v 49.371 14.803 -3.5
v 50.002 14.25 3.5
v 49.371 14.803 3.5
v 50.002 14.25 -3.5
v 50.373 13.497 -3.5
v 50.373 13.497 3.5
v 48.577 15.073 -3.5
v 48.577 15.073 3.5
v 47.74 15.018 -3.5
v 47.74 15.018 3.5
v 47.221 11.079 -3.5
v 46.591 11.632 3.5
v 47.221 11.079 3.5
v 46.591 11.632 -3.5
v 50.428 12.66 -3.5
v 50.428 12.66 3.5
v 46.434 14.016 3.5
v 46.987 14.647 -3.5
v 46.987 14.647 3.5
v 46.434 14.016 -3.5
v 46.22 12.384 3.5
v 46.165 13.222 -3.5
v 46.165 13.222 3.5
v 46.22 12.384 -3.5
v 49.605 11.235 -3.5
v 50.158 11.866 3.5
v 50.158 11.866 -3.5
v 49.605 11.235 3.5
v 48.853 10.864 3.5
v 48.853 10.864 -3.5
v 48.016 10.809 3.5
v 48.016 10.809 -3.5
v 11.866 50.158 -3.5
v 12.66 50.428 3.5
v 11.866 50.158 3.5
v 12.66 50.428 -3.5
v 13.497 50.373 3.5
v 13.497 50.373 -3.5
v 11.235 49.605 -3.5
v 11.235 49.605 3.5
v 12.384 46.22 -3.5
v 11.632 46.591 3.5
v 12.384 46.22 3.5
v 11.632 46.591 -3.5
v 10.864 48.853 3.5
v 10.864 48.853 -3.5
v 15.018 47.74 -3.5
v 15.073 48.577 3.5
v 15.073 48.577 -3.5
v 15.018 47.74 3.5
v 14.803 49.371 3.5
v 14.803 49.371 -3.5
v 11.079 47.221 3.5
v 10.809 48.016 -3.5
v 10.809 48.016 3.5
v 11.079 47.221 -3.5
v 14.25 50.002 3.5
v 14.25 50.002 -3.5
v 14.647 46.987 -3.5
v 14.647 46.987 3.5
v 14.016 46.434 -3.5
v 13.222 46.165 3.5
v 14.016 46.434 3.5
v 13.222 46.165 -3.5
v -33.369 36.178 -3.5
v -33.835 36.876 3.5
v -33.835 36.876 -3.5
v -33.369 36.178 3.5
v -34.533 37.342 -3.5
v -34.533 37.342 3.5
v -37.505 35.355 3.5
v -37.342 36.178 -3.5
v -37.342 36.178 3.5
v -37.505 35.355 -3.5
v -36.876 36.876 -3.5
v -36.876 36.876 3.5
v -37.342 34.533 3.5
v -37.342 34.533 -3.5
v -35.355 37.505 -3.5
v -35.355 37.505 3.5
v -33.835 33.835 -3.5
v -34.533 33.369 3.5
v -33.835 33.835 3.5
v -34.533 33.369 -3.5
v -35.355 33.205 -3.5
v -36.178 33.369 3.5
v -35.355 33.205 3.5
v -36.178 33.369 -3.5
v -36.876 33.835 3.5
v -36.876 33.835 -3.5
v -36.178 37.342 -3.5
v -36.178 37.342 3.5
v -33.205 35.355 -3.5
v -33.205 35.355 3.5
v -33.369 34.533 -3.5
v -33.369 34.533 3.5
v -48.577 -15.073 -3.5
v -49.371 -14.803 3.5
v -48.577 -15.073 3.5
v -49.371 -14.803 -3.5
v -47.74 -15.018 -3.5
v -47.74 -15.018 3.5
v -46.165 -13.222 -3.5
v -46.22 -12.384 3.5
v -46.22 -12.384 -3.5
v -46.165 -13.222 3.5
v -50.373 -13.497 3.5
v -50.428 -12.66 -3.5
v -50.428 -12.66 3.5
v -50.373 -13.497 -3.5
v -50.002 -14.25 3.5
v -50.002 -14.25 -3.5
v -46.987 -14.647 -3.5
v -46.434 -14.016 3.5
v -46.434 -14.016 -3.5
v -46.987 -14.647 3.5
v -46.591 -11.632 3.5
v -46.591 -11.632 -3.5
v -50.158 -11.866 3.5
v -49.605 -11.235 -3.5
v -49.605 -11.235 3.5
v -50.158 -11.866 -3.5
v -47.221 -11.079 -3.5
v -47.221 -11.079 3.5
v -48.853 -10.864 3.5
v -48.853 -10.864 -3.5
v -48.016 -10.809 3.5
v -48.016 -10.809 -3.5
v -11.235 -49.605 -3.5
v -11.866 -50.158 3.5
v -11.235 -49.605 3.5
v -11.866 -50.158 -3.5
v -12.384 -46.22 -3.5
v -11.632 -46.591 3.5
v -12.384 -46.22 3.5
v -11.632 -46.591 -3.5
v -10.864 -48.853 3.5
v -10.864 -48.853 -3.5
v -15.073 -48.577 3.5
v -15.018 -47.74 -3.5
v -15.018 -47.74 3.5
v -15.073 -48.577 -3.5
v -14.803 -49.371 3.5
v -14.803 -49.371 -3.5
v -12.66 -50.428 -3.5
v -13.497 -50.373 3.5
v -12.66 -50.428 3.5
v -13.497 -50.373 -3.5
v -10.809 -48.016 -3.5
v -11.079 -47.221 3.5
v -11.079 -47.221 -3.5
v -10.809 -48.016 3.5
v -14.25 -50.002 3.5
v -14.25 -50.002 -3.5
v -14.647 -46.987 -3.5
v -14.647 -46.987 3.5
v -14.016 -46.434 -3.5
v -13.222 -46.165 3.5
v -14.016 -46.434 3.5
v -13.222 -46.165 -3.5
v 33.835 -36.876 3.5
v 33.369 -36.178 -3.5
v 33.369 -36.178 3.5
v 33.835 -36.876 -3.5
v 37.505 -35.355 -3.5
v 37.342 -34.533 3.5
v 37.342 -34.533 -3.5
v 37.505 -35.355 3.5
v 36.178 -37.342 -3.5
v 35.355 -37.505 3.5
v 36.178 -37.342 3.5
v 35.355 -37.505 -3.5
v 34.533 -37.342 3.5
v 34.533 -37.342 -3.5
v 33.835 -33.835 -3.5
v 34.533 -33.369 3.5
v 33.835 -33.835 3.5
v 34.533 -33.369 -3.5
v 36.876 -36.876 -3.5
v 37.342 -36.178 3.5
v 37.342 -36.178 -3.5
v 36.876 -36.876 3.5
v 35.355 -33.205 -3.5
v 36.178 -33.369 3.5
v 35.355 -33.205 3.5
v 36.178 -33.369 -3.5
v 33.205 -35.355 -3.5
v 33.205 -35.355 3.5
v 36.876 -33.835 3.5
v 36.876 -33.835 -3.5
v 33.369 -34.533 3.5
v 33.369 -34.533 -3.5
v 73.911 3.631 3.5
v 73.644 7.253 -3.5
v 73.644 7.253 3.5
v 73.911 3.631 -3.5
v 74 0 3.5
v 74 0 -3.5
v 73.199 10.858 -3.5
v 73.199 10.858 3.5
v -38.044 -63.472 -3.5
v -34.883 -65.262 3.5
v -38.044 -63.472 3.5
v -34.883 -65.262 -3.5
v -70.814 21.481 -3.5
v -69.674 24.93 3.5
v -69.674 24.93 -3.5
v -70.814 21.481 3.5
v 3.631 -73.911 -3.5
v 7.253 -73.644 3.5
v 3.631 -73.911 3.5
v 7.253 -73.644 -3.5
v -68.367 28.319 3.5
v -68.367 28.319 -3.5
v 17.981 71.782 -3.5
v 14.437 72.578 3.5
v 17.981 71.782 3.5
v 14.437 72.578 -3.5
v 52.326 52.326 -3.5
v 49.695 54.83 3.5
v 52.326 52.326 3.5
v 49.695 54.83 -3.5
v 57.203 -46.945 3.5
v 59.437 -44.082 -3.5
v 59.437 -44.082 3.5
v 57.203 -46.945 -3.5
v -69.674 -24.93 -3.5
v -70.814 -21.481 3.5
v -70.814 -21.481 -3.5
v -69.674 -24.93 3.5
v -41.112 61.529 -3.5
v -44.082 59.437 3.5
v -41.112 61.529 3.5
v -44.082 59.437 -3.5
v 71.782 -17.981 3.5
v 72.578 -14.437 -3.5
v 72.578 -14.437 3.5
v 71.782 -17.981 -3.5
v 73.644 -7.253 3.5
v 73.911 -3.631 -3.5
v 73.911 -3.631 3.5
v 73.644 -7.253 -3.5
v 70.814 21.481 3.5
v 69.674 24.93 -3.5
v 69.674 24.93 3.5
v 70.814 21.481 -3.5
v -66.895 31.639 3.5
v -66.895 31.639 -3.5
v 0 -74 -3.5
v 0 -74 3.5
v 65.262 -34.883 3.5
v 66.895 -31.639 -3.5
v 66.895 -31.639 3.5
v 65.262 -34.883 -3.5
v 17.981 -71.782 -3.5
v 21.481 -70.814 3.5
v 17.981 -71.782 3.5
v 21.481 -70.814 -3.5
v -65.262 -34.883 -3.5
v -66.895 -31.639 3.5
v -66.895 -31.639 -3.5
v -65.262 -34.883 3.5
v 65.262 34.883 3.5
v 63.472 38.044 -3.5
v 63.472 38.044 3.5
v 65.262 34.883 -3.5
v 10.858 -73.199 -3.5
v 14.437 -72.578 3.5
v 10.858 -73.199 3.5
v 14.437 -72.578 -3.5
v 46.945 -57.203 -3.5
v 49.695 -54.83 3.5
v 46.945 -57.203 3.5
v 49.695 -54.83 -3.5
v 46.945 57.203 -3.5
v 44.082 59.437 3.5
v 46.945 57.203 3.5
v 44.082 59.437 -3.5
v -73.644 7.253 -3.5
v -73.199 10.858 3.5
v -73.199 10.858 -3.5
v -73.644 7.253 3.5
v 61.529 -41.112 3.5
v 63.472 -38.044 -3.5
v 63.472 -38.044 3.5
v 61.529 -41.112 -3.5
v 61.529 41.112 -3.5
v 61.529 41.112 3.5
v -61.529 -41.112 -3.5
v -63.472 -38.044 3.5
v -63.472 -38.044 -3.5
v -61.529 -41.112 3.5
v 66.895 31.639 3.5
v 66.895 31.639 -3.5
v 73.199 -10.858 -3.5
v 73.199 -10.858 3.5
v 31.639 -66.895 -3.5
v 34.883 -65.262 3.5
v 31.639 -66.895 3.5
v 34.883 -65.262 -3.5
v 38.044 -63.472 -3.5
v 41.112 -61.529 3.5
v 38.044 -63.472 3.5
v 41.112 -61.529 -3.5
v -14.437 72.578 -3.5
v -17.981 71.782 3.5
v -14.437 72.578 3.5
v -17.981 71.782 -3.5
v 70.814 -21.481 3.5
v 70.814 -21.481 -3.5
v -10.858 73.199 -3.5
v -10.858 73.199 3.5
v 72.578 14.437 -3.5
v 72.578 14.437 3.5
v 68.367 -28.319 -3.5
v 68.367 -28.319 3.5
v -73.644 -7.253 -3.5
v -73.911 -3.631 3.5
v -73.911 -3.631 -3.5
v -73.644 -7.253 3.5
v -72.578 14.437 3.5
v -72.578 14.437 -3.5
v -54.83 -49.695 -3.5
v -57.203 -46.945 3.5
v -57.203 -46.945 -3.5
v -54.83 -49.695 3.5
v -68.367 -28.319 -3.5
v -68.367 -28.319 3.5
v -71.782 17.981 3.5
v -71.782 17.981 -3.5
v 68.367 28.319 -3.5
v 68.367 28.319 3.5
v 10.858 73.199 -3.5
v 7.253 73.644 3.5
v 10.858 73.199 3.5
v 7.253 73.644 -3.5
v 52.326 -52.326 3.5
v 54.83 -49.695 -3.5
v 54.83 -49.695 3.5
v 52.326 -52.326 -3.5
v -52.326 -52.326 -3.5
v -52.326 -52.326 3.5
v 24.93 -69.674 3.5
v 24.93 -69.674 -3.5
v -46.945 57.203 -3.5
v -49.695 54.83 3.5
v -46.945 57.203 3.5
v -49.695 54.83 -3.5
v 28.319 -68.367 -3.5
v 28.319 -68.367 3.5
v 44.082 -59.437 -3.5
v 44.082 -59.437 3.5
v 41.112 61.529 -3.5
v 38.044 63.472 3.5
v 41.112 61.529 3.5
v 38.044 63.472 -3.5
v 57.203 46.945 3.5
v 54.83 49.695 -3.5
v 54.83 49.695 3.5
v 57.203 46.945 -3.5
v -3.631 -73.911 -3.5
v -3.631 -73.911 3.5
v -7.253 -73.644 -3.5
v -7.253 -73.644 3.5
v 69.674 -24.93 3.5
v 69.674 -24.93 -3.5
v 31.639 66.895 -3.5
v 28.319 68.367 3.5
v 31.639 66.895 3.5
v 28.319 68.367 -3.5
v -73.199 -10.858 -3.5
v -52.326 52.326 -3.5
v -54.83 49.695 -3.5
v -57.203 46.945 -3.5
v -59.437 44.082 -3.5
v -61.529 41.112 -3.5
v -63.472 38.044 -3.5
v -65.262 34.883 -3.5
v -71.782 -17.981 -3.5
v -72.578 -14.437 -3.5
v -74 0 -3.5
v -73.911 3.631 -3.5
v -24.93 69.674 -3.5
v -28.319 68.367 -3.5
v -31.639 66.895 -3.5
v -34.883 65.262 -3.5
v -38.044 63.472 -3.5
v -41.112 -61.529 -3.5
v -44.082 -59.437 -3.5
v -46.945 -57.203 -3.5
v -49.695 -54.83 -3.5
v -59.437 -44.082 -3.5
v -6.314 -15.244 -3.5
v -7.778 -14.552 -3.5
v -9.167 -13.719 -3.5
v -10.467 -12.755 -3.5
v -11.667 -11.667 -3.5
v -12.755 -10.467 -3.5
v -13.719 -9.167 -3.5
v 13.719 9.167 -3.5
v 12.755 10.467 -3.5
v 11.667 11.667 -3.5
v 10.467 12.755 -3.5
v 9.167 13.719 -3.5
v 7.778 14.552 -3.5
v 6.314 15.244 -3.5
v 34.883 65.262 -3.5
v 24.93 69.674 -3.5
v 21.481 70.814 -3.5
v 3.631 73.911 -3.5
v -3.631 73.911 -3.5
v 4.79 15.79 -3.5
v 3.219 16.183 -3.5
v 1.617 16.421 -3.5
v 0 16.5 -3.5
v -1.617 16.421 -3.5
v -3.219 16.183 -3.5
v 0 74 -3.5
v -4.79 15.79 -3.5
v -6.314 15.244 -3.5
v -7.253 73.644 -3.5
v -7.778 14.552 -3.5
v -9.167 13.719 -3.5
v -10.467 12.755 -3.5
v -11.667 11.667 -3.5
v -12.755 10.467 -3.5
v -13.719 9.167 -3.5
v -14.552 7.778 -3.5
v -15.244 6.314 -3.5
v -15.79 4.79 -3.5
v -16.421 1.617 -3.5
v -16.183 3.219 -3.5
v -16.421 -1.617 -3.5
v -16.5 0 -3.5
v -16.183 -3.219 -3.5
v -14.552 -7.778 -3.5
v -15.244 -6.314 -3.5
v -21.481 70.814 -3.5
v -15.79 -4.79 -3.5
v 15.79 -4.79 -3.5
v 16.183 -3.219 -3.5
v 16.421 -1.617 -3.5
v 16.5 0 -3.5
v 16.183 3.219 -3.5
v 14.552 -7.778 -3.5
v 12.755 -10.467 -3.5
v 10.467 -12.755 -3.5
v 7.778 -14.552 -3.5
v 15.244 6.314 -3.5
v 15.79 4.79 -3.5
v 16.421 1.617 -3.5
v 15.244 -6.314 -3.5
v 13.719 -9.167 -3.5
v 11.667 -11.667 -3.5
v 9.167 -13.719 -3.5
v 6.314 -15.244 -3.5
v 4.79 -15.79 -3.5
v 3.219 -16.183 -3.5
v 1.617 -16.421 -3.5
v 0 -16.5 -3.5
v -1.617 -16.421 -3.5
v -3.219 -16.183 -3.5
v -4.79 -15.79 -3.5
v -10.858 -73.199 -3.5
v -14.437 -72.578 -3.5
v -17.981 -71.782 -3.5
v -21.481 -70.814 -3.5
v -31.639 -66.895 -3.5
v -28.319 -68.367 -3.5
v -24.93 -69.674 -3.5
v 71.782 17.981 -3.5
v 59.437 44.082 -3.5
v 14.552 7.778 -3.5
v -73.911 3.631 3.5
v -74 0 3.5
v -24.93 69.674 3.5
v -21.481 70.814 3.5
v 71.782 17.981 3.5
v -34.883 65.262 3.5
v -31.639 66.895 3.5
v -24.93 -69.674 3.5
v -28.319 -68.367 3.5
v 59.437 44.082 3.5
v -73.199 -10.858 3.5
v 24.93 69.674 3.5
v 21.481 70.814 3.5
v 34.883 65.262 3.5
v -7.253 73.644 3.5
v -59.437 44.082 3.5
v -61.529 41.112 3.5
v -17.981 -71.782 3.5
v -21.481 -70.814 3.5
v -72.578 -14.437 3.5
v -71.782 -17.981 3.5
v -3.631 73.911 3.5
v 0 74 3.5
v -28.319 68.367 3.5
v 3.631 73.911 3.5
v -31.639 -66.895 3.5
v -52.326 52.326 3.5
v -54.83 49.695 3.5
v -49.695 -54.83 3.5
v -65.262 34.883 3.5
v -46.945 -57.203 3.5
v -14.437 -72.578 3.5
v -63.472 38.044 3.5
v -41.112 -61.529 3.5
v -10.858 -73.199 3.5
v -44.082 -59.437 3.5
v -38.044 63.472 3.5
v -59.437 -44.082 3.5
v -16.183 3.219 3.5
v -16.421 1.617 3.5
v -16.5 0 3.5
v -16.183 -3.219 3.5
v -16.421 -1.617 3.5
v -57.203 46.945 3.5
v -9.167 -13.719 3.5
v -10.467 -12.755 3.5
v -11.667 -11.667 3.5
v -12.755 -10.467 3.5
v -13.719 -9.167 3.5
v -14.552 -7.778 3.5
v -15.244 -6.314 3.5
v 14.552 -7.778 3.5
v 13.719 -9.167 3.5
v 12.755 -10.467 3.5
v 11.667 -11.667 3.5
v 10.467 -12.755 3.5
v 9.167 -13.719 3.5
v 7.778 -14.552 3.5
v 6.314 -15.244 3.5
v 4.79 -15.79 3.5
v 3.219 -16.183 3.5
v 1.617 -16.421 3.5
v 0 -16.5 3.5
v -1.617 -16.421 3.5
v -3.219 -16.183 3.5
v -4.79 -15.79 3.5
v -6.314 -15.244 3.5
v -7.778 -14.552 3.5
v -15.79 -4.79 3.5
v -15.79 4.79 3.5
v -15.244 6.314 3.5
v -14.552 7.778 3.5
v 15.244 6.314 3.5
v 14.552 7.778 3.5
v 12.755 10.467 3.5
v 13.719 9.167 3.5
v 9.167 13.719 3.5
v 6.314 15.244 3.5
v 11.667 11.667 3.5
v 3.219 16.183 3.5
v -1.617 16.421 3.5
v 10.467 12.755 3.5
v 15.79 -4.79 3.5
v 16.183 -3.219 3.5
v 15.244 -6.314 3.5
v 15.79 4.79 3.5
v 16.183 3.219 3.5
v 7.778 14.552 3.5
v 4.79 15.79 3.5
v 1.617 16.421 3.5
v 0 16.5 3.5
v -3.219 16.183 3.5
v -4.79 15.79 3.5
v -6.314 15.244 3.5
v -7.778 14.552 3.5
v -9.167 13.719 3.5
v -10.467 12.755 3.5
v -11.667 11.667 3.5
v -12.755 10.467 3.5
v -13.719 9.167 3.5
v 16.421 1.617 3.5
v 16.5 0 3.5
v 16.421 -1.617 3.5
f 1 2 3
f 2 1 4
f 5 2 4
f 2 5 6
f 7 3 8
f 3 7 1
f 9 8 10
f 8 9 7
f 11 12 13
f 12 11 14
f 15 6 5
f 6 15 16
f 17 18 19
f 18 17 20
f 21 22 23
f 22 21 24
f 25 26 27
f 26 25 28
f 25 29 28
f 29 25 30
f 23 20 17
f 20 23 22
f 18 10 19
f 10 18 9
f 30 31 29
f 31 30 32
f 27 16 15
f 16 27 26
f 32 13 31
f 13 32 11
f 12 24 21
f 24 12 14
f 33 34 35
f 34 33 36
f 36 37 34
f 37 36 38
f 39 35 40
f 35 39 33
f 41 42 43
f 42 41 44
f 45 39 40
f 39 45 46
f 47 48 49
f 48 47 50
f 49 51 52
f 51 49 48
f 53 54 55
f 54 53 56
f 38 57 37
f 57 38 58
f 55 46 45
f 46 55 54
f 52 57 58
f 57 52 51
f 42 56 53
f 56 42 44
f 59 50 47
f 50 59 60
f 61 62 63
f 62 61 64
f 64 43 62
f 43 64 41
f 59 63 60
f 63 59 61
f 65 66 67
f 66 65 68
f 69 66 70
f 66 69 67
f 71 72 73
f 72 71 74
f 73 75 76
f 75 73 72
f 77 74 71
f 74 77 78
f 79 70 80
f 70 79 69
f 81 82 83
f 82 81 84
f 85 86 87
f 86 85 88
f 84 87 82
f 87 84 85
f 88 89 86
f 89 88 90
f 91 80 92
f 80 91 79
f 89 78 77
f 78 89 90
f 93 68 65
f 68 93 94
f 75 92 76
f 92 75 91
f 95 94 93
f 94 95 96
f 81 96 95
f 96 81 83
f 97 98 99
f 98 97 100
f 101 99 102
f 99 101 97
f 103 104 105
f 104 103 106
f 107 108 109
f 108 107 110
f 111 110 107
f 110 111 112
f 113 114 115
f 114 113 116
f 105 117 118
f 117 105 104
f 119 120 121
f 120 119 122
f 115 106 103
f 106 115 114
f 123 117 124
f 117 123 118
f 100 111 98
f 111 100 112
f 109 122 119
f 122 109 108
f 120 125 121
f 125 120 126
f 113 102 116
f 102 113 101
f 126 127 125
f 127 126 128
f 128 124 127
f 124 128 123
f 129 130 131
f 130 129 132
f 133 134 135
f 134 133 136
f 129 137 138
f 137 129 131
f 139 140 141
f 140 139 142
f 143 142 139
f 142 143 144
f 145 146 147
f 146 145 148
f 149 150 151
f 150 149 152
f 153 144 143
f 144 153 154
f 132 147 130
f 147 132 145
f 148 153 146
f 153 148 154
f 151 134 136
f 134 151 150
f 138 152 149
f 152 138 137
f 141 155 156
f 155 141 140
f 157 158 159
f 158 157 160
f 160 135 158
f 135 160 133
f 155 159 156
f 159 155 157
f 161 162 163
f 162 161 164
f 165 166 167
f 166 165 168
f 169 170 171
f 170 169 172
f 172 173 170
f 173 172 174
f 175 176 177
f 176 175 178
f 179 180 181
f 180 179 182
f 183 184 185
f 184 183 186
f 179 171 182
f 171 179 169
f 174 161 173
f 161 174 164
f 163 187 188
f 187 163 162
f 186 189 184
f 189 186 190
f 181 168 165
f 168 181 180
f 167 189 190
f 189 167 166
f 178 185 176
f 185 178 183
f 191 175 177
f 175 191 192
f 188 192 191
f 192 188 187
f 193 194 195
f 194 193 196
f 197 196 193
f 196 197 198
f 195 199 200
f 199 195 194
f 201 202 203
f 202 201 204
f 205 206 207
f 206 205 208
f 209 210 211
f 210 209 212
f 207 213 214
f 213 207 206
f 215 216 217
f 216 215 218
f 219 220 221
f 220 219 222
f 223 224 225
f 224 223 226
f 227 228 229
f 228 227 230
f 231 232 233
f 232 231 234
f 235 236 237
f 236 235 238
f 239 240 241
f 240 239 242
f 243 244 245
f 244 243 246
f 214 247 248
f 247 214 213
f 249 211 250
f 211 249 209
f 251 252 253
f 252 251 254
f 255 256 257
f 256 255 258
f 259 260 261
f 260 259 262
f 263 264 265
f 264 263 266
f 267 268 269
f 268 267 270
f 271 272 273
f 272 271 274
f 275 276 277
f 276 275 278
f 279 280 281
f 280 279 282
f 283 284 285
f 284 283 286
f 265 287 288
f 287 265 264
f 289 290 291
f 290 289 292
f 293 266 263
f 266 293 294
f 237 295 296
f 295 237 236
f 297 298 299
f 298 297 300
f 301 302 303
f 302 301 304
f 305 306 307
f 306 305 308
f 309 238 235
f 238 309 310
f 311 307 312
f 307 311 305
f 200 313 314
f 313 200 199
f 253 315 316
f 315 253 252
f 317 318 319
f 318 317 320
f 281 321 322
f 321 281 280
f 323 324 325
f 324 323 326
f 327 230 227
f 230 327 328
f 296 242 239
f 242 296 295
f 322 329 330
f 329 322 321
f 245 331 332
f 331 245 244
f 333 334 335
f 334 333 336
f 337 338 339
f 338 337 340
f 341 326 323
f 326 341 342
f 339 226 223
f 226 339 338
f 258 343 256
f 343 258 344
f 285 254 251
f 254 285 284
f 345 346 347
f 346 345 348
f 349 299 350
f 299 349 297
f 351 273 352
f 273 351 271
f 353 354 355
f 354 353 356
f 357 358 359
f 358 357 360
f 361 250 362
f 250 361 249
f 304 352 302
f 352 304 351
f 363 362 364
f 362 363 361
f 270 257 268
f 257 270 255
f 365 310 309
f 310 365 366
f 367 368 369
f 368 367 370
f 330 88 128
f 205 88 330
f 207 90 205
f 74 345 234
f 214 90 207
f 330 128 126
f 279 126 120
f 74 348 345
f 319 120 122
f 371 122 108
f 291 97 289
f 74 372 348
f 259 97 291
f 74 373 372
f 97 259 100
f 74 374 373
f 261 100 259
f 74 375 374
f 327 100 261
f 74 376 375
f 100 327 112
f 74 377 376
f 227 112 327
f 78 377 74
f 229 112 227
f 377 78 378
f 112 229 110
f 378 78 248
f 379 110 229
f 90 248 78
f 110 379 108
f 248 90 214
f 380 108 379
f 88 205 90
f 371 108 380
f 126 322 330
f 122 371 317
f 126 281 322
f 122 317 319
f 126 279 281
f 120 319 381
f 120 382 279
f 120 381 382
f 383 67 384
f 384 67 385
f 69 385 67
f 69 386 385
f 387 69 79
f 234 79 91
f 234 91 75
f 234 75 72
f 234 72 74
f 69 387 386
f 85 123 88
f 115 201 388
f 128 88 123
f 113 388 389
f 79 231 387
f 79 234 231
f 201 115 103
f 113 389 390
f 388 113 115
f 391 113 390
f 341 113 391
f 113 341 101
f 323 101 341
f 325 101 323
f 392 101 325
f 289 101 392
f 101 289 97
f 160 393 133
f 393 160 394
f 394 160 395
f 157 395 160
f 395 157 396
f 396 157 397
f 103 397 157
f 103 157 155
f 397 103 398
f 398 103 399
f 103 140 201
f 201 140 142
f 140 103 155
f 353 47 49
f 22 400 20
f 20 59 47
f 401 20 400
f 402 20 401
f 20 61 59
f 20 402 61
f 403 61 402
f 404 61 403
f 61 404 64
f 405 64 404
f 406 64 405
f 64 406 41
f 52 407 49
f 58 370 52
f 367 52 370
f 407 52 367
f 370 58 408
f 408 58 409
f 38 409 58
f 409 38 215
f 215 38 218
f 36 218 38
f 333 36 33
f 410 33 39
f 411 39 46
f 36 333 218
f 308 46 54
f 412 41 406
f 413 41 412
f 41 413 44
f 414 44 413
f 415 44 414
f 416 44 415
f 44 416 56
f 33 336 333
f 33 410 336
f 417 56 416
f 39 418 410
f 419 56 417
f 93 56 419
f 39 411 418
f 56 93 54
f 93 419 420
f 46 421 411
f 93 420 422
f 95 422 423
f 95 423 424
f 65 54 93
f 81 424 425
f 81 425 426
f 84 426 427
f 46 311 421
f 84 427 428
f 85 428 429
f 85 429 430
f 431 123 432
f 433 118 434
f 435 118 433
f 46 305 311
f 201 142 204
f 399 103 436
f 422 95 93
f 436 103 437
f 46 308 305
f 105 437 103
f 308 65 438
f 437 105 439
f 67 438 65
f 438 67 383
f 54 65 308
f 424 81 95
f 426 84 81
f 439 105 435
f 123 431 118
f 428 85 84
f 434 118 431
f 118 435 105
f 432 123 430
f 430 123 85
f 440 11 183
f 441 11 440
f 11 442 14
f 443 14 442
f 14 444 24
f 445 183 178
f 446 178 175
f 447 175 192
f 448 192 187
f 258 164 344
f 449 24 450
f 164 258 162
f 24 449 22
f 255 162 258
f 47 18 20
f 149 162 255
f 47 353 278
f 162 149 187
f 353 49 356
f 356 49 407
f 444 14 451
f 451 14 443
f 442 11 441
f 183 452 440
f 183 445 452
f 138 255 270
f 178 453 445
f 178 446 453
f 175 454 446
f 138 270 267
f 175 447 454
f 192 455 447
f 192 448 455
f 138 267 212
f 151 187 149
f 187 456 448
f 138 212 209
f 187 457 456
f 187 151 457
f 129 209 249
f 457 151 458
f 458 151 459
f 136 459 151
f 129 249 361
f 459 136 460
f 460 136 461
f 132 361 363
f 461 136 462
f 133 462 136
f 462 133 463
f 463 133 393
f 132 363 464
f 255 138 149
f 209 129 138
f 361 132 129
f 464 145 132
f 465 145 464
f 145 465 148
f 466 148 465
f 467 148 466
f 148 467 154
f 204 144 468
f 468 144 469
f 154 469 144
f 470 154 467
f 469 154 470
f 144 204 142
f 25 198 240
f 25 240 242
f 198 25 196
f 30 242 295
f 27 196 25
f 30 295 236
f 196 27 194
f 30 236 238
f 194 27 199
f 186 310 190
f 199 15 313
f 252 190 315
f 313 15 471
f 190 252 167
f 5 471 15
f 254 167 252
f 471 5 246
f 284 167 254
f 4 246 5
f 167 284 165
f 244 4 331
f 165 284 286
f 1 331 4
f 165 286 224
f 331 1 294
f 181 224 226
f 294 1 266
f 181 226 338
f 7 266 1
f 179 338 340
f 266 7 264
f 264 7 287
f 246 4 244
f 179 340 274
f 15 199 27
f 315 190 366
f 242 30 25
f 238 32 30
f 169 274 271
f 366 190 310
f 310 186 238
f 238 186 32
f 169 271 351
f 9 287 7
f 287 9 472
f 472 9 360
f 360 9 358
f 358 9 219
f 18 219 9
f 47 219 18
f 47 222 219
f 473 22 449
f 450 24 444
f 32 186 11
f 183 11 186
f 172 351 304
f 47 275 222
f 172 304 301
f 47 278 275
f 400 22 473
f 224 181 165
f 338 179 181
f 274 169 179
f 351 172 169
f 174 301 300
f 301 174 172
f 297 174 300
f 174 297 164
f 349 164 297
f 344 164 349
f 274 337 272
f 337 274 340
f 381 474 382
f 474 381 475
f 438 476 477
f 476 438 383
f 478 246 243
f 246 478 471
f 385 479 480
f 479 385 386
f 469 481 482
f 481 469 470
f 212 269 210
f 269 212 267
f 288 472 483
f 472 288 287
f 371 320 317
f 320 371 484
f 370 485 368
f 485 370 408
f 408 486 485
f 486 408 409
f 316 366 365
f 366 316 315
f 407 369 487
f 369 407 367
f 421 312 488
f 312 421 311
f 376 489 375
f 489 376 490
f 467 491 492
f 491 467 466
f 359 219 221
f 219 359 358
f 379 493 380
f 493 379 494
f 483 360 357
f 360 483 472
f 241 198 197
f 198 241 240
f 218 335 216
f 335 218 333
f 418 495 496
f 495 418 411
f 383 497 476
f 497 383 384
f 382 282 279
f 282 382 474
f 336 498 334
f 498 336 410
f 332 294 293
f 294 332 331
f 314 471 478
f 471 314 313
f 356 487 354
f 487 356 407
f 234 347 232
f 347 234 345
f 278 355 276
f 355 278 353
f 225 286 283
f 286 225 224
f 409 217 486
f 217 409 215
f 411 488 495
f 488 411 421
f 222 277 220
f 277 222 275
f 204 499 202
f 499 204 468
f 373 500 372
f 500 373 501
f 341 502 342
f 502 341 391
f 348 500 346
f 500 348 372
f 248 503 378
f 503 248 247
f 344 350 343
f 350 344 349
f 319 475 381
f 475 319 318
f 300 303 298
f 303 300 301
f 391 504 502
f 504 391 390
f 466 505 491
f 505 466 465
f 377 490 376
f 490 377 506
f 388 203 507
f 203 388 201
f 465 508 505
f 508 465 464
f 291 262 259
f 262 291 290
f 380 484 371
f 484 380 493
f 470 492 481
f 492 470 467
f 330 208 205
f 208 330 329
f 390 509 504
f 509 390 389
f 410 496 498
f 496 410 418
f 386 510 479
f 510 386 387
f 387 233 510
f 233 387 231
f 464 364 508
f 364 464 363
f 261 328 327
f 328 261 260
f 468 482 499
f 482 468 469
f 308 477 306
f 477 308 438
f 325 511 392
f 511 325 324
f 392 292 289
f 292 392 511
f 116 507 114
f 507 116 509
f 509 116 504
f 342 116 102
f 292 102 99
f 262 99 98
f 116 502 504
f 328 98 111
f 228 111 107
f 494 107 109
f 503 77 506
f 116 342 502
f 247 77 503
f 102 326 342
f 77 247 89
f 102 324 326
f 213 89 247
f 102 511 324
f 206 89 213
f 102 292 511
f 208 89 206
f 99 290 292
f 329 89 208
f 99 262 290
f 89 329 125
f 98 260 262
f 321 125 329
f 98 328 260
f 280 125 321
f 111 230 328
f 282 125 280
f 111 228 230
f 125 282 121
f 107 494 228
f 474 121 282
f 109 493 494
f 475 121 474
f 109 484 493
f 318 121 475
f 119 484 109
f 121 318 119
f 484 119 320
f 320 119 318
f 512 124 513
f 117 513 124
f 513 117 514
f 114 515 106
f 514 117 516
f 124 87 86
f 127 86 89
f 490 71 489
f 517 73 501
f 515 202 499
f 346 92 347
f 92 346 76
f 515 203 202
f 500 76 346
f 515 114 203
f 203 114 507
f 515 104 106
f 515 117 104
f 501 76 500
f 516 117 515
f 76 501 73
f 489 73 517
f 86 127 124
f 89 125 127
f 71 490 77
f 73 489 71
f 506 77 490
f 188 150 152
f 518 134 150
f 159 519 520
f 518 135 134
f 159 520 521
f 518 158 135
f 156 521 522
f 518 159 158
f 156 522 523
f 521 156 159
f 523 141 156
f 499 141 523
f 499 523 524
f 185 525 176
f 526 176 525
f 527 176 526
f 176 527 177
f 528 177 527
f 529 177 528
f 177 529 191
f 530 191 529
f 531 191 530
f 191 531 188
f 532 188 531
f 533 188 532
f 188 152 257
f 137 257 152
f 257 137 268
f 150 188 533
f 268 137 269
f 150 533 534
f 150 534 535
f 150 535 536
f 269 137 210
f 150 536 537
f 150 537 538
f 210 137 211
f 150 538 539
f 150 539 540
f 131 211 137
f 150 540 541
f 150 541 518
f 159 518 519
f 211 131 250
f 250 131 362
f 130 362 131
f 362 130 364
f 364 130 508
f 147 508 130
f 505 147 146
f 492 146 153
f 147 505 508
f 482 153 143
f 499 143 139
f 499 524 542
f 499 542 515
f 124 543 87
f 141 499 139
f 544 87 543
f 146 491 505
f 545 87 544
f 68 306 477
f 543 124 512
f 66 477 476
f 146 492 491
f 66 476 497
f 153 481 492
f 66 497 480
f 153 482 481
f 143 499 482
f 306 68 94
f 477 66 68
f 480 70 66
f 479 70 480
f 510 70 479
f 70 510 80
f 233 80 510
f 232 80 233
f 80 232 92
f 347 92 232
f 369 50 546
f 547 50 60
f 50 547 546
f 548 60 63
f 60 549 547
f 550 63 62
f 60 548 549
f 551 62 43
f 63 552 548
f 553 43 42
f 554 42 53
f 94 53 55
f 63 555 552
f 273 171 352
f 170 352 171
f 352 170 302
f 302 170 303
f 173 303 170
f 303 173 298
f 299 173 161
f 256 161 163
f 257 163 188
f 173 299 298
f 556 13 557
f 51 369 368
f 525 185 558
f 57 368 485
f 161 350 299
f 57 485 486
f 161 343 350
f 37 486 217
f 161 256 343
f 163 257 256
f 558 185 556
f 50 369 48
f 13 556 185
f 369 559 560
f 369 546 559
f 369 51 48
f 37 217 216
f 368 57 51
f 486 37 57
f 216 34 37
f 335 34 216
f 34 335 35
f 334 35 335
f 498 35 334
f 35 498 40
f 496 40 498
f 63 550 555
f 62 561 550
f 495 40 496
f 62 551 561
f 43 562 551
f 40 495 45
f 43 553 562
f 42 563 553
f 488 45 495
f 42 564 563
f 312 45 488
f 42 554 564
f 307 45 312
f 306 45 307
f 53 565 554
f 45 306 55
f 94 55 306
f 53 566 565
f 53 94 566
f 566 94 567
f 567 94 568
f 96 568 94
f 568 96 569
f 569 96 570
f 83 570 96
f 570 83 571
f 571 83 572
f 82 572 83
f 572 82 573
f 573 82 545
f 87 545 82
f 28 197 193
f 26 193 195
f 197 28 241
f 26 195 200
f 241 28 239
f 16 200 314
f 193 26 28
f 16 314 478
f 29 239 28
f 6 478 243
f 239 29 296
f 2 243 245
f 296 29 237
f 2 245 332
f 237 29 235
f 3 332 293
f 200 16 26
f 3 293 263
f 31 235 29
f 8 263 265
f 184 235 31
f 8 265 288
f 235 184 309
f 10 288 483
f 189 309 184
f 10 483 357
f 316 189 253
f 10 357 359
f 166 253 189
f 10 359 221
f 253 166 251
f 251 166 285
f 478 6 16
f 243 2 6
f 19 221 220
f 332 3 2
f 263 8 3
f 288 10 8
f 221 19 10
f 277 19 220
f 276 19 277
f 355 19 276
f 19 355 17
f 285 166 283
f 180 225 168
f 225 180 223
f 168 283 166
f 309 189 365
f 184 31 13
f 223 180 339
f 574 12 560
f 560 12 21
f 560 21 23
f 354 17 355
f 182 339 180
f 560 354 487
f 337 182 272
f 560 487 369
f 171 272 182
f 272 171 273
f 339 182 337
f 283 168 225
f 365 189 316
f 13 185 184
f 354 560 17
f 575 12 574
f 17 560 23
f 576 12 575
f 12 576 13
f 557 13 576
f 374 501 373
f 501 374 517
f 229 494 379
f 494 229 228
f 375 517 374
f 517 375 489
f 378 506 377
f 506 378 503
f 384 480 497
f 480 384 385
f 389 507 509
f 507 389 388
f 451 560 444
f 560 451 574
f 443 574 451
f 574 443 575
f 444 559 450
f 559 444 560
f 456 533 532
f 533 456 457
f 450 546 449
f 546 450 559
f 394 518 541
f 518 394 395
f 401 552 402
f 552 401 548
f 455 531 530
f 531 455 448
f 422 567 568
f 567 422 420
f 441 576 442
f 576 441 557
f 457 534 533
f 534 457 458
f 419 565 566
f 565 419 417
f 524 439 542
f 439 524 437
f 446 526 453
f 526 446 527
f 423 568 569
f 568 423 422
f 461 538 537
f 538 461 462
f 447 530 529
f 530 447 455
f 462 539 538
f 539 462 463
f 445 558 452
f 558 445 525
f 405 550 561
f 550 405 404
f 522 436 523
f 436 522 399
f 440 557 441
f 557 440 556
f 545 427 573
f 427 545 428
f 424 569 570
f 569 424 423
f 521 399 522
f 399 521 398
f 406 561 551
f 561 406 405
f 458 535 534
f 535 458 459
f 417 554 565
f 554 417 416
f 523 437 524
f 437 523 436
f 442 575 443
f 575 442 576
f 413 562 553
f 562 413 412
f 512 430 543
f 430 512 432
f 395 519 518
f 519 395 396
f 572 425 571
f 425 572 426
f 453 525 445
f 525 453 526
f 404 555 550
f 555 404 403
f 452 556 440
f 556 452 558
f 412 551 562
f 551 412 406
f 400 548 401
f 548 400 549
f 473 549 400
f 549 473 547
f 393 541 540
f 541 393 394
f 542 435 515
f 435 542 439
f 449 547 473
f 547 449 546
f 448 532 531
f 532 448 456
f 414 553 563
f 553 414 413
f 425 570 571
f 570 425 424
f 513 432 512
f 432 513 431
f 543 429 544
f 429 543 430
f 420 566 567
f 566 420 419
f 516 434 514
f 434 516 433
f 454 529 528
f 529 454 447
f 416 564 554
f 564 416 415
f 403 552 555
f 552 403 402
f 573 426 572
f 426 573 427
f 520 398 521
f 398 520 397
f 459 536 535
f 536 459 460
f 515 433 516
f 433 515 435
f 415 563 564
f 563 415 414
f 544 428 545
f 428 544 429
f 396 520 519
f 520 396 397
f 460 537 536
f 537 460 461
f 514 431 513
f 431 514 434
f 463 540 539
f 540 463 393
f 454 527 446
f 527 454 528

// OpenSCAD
/*
 * CD/DVD Version - Clear Viewport Plate
 * For observing the spiral flow during air testing.
 * Print in clear PETG if possible.
 */

module cd_dvd_clear_viewport() {
    difference() {
        cylinder(d=120 + 28, h=7, center=true, $fn=128);
        
        // Central opening
        cylinder(d=33, h=9, center=true, $fn=64);
        
        // Bolt holes
        for (i = [0:5]) {
            rotate([0,0,i*60 + 15])
                translate([120/2 - 10, 0, 0])
                    cylinder(d=4.3, h=9, center=true, $fn=16);
        }
    }
}

cd_dvd_clear_viewport();
